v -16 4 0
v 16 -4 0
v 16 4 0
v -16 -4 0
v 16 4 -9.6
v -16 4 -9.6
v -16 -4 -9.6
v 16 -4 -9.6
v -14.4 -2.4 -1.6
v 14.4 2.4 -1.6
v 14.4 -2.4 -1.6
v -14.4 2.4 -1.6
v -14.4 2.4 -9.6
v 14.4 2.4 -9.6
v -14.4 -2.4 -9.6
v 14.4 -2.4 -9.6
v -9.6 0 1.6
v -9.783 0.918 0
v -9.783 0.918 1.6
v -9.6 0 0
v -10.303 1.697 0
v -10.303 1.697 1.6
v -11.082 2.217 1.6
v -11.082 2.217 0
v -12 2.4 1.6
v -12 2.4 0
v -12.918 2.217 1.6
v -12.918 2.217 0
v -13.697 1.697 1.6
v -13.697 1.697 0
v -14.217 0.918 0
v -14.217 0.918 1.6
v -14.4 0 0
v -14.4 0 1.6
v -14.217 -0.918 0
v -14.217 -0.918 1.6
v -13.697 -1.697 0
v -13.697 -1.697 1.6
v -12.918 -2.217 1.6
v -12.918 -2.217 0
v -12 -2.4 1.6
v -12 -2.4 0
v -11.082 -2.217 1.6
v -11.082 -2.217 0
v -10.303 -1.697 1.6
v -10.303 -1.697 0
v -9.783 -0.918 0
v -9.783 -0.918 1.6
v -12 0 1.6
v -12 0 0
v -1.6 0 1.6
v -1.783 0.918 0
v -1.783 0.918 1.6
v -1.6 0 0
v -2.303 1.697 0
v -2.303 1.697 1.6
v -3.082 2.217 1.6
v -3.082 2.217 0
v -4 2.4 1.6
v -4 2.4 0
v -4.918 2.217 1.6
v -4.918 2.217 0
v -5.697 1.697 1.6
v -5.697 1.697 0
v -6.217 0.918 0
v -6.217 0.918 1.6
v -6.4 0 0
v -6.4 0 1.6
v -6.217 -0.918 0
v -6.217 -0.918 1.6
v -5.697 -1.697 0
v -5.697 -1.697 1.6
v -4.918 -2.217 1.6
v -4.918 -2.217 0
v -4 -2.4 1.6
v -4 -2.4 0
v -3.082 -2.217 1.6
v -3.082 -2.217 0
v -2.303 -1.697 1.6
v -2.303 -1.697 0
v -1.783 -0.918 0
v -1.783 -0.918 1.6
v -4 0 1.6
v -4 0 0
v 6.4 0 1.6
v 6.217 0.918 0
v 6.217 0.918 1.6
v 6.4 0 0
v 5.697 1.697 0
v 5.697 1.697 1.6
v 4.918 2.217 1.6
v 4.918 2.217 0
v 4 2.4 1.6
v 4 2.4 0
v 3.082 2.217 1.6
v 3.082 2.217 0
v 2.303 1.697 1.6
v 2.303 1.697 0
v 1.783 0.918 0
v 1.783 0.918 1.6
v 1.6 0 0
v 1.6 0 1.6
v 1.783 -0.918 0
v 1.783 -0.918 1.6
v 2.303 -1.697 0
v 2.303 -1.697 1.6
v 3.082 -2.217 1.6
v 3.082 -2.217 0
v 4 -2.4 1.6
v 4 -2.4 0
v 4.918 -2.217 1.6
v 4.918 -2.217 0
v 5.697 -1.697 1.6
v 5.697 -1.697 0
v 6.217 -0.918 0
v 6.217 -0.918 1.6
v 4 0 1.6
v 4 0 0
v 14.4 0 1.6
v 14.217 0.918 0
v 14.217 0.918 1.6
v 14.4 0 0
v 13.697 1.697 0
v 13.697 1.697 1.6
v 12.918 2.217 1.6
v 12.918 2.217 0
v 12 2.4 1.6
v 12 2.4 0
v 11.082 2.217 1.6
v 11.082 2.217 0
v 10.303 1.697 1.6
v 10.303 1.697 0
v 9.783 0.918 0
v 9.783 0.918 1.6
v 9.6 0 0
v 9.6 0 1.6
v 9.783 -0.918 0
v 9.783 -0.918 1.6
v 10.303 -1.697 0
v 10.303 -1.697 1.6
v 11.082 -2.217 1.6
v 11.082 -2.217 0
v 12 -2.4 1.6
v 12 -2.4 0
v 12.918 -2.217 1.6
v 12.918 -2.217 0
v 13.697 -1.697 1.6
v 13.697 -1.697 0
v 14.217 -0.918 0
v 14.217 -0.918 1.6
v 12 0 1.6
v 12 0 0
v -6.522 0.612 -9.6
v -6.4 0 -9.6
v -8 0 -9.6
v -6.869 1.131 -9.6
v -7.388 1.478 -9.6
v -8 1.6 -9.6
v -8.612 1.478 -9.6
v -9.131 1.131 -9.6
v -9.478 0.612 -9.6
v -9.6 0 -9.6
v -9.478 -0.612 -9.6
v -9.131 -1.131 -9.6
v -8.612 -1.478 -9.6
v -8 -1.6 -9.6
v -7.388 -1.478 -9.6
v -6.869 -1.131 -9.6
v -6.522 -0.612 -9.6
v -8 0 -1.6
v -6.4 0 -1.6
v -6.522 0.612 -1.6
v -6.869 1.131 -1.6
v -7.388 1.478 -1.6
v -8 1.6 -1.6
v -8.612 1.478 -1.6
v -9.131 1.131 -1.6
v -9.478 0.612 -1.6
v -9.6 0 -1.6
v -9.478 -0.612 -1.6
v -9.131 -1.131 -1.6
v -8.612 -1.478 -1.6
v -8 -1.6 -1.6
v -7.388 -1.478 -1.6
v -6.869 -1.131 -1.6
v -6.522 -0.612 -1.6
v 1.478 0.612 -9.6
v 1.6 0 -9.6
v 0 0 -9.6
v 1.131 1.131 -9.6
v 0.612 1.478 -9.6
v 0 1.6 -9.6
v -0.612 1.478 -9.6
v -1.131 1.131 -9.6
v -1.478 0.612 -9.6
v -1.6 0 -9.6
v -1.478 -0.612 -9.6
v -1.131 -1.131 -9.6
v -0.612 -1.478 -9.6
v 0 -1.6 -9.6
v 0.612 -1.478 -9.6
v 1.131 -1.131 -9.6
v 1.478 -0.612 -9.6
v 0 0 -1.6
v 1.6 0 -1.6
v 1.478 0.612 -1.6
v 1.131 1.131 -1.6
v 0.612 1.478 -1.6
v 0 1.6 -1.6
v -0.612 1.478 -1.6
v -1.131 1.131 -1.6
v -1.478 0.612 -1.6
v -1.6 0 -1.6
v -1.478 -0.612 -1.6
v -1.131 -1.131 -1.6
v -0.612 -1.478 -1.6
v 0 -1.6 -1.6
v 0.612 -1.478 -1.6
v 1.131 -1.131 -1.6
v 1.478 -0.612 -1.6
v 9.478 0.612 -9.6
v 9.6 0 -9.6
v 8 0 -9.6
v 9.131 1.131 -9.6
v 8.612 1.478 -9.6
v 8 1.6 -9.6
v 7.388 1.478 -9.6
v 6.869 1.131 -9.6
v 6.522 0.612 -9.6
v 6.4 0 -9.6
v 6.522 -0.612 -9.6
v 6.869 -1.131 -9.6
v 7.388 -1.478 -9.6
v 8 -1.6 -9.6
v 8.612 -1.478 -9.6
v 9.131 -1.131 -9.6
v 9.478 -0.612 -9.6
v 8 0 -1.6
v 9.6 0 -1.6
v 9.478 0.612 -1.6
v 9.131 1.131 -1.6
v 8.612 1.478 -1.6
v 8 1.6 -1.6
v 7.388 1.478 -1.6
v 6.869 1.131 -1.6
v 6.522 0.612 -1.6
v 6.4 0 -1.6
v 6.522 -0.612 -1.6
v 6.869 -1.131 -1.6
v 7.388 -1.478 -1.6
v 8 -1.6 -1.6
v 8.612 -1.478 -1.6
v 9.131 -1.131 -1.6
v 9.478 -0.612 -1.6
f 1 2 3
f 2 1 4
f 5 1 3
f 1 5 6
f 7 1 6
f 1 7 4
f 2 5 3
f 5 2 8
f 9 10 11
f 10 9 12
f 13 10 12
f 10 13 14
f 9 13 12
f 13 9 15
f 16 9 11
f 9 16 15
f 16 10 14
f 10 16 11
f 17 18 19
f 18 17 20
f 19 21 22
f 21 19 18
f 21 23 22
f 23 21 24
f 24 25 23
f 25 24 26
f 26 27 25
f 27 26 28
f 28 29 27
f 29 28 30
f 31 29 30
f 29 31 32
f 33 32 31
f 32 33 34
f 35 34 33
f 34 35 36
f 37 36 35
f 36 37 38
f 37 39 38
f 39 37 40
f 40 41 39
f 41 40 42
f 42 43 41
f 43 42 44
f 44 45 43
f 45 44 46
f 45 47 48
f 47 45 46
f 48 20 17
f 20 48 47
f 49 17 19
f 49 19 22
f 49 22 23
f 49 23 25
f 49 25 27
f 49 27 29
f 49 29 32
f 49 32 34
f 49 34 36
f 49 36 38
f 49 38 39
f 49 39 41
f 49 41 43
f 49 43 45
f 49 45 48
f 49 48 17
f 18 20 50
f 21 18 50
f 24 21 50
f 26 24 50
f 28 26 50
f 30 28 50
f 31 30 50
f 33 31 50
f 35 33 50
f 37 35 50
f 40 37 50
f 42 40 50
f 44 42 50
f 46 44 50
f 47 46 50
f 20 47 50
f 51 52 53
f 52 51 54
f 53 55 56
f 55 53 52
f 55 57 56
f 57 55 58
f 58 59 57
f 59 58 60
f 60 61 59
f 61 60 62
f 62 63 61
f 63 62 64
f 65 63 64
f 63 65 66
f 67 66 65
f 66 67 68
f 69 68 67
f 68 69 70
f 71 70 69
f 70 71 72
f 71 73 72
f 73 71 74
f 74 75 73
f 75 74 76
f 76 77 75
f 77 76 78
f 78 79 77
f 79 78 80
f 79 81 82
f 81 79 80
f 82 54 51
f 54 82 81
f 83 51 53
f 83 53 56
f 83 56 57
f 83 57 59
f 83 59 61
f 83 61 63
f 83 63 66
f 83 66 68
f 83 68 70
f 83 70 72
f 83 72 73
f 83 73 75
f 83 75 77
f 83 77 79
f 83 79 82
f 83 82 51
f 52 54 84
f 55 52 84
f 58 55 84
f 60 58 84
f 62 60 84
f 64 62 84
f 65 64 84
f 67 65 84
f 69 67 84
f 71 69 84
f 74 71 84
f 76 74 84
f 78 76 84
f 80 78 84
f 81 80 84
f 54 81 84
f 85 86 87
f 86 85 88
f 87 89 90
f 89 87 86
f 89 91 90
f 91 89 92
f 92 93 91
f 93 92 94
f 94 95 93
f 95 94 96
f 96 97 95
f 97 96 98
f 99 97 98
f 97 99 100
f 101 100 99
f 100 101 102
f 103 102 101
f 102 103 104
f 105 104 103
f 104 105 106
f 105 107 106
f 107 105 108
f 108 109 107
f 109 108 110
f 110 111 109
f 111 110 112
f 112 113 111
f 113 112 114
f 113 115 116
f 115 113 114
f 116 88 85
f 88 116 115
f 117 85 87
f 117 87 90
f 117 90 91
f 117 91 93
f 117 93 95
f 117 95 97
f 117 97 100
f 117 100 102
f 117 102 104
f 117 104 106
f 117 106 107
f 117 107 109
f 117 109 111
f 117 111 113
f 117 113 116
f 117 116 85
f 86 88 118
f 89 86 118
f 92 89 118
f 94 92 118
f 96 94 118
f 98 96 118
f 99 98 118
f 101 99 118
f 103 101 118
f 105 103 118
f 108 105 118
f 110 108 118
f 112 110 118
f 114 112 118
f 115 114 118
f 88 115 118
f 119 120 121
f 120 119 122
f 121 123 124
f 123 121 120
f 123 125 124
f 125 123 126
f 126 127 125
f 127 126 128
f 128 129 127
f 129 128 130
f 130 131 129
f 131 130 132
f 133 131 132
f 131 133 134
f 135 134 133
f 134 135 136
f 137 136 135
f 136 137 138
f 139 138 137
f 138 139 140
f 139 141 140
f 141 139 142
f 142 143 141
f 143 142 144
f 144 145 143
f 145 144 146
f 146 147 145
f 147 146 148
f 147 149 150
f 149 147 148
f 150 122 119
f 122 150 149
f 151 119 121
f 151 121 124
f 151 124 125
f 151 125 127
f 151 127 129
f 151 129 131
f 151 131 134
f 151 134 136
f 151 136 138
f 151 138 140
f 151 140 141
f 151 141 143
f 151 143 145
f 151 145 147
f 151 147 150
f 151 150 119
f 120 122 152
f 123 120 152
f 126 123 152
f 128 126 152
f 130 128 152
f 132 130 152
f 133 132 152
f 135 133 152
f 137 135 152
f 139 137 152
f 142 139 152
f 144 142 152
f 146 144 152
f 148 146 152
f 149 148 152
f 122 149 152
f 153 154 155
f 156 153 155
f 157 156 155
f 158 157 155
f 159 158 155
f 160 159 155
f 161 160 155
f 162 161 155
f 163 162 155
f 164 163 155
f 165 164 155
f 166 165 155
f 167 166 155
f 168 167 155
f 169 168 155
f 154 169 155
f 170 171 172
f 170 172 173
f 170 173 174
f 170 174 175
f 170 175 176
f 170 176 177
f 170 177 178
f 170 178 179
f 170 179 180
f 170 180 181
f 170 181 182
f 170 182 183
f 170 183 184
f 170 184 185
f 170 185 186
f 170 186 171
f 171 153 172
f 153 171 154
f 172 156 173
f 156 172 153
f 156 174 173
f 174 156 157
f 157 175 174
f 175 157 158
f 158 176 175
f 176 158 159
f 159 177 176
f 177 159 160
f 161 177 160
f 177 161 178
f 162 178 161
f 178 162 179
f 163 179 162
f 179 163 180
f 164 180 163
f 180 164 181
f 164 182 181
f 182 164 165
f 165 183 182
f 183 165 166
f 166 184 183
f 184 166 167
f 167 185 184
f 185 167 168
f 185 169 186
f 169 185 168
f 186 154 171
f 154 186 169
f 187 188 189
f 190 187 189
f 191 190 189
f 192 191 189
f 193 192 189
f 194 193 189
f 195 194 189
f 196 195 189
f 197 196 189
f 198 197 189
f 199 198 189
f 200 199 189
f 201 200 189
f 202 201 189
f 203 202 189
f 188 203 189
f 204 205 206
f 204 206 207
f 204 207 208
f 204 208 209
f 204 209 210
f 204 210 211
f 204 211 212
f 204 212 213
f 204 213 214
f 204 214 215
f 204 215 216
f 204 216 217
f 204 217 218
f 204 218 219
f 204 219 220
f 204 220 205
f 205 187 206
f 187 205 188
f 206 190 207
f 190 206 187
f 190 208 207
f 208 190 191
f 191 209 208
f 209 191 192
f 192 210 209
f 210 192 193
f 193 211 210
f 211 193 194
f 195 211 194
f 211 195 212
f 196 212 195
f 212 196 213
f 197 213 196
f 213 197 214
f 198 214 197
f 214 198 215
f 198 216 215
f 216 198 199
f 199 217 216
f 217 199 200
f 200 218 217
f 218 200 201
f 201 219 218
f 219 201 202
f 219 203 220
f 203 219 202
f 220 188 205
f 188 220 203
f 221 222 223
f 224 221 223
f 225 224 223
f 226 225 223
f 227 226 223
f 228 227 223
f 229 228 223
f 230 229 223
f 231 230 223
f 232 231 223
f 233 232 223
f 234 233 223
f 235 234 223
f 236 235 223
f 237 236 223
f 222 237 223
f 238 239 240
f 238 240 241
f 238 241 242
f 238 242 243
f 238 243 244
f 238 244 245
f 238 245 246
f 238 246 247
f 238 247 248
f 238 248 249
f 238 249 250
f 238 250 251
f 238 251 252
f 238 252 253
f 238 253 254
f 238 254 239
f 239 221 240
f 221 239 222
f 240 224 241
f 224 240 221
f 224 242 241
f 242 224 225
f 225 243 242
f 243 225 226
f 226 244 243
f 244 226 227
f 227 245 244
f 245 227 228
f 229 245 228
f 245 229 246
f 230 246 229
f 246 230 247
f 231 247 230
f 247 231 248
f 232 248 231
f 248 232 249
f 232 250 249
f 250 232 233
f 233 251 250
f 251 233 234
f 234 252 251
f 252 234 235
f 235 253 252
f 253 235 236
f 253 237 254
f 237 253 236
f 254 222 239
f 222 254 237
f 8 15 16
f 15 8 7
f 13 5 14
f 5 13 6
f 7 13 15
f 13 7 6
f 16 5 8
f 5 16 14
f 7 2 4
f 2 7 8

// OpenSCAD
// file: ../p/4-4edge.scad
use <../lib.scad>
function ldraw_lib__4_4edge() = [
// 0 Circle 1.0
// 0 Name: 4-4edge.dat
// 0 Author: James Jessiman
// 0 !LDRAW_ORG Primitive UPDATE 2017-01
// 0 !LICENSE Licensed under CC BY 2.0 and CC BY 4.0 : see CAreadme.txt
// 
// 0 BFC CERTIFY CCW
  [0,"BFC","CERTIFY"],
  [0,"BFC","CCW"],
// 
// 0 !HISTORY 1998-12-15 [PTadmin] Official Update 1998-10
// 0 !HISTORY 2005-12-28 [PTadmin] Official Update 2005-01
// 0 !HISTORY 2007-06-24 [PTadmin] Header formatted for Contributor Agreement
// 0 !HISTORY 2008-07-01 [PTadmin] Official Update 2008-01
// 0 !HISTORY 2017-01-15 [Steffen] BFCed
// 0 !HISTORY 2017-12-30 [PTadmin] Official Update 2017-01
// 
// 
// 2 24 1 0 0 0.9239 0 0.3827
  [2,24,1,0,0,0.9239,0,0.3827],
// 2 24 0.9239 0 0.3827 0.7071 0 0.7071
  [2,24,0.9239,0,0.3827,0.7071,0,0.7071],
// 2 24 0.7071 0 0.7071 0.3827 0 0.9239
  [2,24,0.7071,0,0.7071,0.3827,0,0.9239],
// 2 24 0.3827 0 0.9239 0 0 1
  [2,24,0.3827,0,0.9239,0,0,1],
// 2 24 0 0 1 -0.3827 0 0.9239
  [2,24,0,0,1,-0.3827,0,0.9239],
// 2 24 -0.3827 0 0.9239 -0.7071 0 0.7071
  [2,24,-0.3827,0,0.9239,-0.7071,0,0.7071],
// 2 24 -0.7071 0 0.7071 -0.9239 0 0.3827
  [2,24,-0.7071,0,0.7071,-0.9239,0,0.3827],
// 2 24 -0.9239 0 0.3827 -1 0 -0
  [2,24,-0.9239,0,0.3827,-1,0,-0],
// 2 24 -1 0 -0 -0.9239 0 -0.3827
  [2,24,-1,0,-0,-0.9239,0,-0.3827],
// 2 24 -0.9239 0 -0.3827 -0.7071 0 -0.7071
  [2,24,-0.9239,0,-0.3827,-0.7071,0,-0.7071],
// 2 24 -0.7071 0 -0.7071 -0.3827 0 -0.9239
  [2,24,-0.7071,0,-0.7071,-0.3827,0,-0.9239],
// 2 24 -0.3827 0 -0.9239 0 0 -1
  [2,24,-0.3827,0,-0.9239,0,0,-1],
// 2 24 0 0 -1 0.3827 0 -0.9239
  [2,24,0,0,-1,0.3827,0,-0.9239],
// 2 24 0.3827 0 -0.9239 0.7071 0 -0.7071
  [2,24,0.3827,0,-0.9239,0.7071,0,-0.7071],
// 2 24 0.7071 0 -0.7071 0.9239 0 -0.3827
  [2,24,0.7071,0,-0.7071,0.9239,0,-0.3827],
// 2 24 0.9239 0 -0.3827 1 0 0
  [2,24,0.9239,0,-0.3827,1,0,0],
];
module ldraw_lib__4_4edge(step=0, col=false, unit=2/5, alt=false, line=0.2, solid=!$preview)
    makepoly(ldraw_lib__4_4edge(), step=step, col=col, unit=unit, alt=alt, line=line, solid=solid);
ldraw_lib__4_4edge(line=0.2);
// file: ../p/4-4disc.scad
use <../lib.scad>
function ldraw_lib__4_4disc() = [
// 0 Disc 1.0
// 0 Name: 4-4disc.dat
// 0 Author: James Jessiman
// 0 !LDRAW_ORG Primitive UPDATE 2002-02
// 0 !LICENSE Licensed under CC BY 2.0 and CC BY 4.0 : see CAreadme.txt
// 
// 0 BFC CERTIFY CCW
  [0,"BFC","CERTIFY"],
  [0,"BFC","CCW"],
// 
// 0 !HISTORY 1998-12-15 [PTadmin] Official Update 1998-10
// 0 !HISTORY 2002-03-23 [sbliss] Added BFC statement
// 0 !HISTORY 2002-04-25 [PTadmin] Official Update 2002-02
// 0 !HISTORY 2007-06-24 [PTadmin] Header formatted for Contributor Agreement
// 0 !HISTORY 2008-07-01 [PTadmin] Official Update 2008-01
// 
// 
// 3 16 0 0 0 1 0 0 0.9239 0 0.3827
  [3,16,0,0,0,1,0,0,0.9239,0,0.3827],
// 3 16 0 0 0 0.9239 0 0.3827 0.7071 0 0.7071
  [3,16,0,0,0,0.9239,0,0.3827,0.7071,0,0.7071],
// 3 16 0 0 0 0.7071 0 0.7071 0.3827 0 0.9239
  [3,16,0,0,0,0.7071,0,0.7071,0.3827,0,0.9239],
// 3 16 0 0 0 0.3827 0 0.9239 0 0 1
  [3,16,0,0,0,0.3827,0,0.9239,0,0,1],
// 3 16 0 0 0 0 0 1 -0.3827 0 0.9239
  [3,16,0,0,0,0,0,1,-0.3827,0,0.9239],
// 3 16 0 0 0 -0.3827 0 0.9239 -0.7071 0 0.7071
  [3,16,0,0,0,-0.3827,0,0.9239,-0.7071,0,0.7071],
// 3 16 0 0 0 -0.7071 0 0.7071 -0.9239 0 0.3827
  [3,16,0,0,0,-0.7071,0,0.7071,-0.9239,0,0.3827],
// 3 16 0 0 0 -0.9239 0 0.3827 -1 0 -0
  [3,16,0,0,0,-0.9239,0,0.3827,-1,0,-0],
// 3 16 0 0 0 -1 0 -0 -0.9239 0 -0.3827
  [3,16,0,0,0,-1,0,-0,-0.9239,0,-0.3827],
// 3 16 0 0 0 -0.9239 0 -0.3827 -0.7071 0 -0.7071
  [3,16,0,0,0,-0.9239,0,-0.3827,-0.7071,0,-0.7071],
// 3 16 0 0 0 -0.7071 0 -0.7071 -0.3827 0 -0.9239
  [3,16,0,0,0,-0.7071,0,-0.7071,-0.3827,0,-0.9239],
// 3 16 0 0 0 -0.3827 0 -0.9239 0 0 -1
  [3,16,0,0,0,-0.3827,0,-0.9239,0,0,-1],
// 3 16 0 0 0 0 0 -1 0.3827 0 -0.9239
  [3,16,0,0,0,0,0,-1,0.3827,0,-0.9239],
// 3 16 0 0 0 0.3827 0 -0.9239 0.7071 0 -0.7071
  [3,16,0,0,0,0.3827,0,-0.9239,0.7071,0,-0.7071],
// 3 16 0 0 0 0.7071 0 -0.7071 0.9239 0 -0.3827
  [3,16,0,0,0,0.7071,0,-0.7071,0.9239,0,-0.3827],
// 3 16 0 0 0 0.9239 0 -0.3827 1 0 0
  [3,16,0,0,0,0.9239,0,-0.3827,1,0,0],
// 0
];
module ldraw_lib__4_4disc(step=0, col=false, unit=2/5, alt=false, line=0.2, solid=!$preview)
    makepoly(ldraw_lib__4_4disc(), step=step, col=col, unit=unit, alt=alt, line=line, solid=solid);
ldraw_lib__4_4disc(line=0.2);
// file: ../p/4-4cyli.scad
use <../lib.scad>
$fa=1; $fs=0.2;
function ldraw_lib__4_4cyli(realsolid=false) = [
// 0 Cylinder 1.0
// 0 Name: 4-4cyli.dat
// 0 Author: James Jessiman
// 0 !LDRAW_ORG Primitive UPDATE 2005-01
// 0 !LICENSE Licensed under CC BY 2.0 and CC BY 4.0 : see CAreadme.txt
// 
// 0 BFC CERTIFY CCW
  [0,"BFC","CERTIFY"],
  [0,"BFC","CCW"],
// 
// 0 !HISTORY 1998-12-15 [PTadmin] Official Update 1998-10
// 0 !HISTORY 2002-03-23 [sbliss] Added BFC statement; merged headers from files in distributions LDraw 0.27 and Complete.
// 0 !HISTORY 2002-04-25 [PTadmin] Official Update 2002-02
// 0 !HISTORY 2004-12-14 [guyvivan] BFC CCW
// 0 !HISTORY 2005-12-28 [PTadmin] Official Update 2005-01
// 0 !HISTORY 2007-06-24 [PTadmin] Header formatted for Contributor Agreement
// 0 !HISTORY 2008-07-01 [PTadmin] Official Update 2008-01
// 
// 
// 4 16 1 1 0 0.9239 1 0.3827 0.9239 0 0.3827 1 0 0
  [4,16,1,1,0,0.9239,1,0.3827,0.9239,0,0.3827,1,0,0],
// 5 24 1 0 0 1 1 0 0.9239 0 0.3827 0.9239 0 -0.3827
  [5,24,1,0,0,1,1,0,0.9239,0,0.3827,0.9239,0,-0.3827],
// 4 16 0.9239 1 0.3827 0.7071 1 0.7071 0.7071 0 0.7071 0.9239 0 0.3827
  [4,16,0.9239,1,0.3827,0.7071,1,0.7071,0.7071,0,0.7071,0.9239,0,0.3827],
// 5 24 0.9239 0 0.3827 0.9239 1 0.3827 0.7071 0 0.7071 1 0 0
  [5,24,0.9239,0,0.3827,0.9239,1,0.3827,0.7071,0,0.7071,1,0,0],
// 4 16 0.7071 1 0.7071 0.3827 1 0.9239 0.3827 0 0.9239 0.7071 0 0.7071
  [4,16,0.7071,1,0.7071,0.3827,1,0.9239,0.3827,0,0.9239,0.7071,0,0.7071],
// 5 24 0.7071 0 0.7071 0.7071 1 0.7071 0.3827 0 0.9239 0.9239 0 0.3827
  [5,24,0.7071,0,0.7071,0.7071,1,0.7071,0.3827,0,0.9239,0.9239,0,0.3827],
// 4 16 0.3827 1 0.9239 0 1 1 0 0 1 0.3827 0 0.9239
  [4,16,0.3827,1,0.9239,0,1,1,0,0,1,0.3827,0,0.9239],
// 5 24 0.3827 0 0.9239 0.3827 1 0.9239 0 0 1 0.7071 0 0.7071
  [5,24,0.3827,0,0.9239,0.3827,1,0.9239,0,0,1,0.7071,0,0.7071],
// 4 16 0 1 1 -0.3827 1 0.9239 -0.3827 0 0.9239 0 0 1
  [4,16,0,1,1,-0.3827,1,0.9239,-0.3827,0,0.9239,0,0,1],
// 5 24 0 0 1 0 1 1 -0.3827 0 0.9239 0.3827 0 0.9239
  [5,24,0,0,1,0,1,1,-0.3827,0,0.9239,0.3827,0,0.9239],
// 4 16 -0.3827 1 0.9239 -0.7071 1 0.7071 -0.7071 0 0.7071 -0.3827 0 0.9239
  [4,16,-0.3827,1,0.9239,-0.7071,1,0.7071,-0.7071,0,0.7071,-0.3827,0,0.9239],
// 5 24 -0.3827 0 0.9239 -0.3827 1 0.9239 -0.7071 0 0.7071 0 0 1
  [5,24,-0.3827,0,0.9239,-0.3827,1,0.9239,-0.7071,0,0.7071,0,0,1],
// 4 16 -0.7071 1 0.7071 -0.9239 1 0.3827 -0.9239 0 0.3827 -0.7071 0 0.7071
  [4,16,-0.7071,1,0.7071,-0.9239,1,0.3827,-0.9239,0,0.3827,-0.7071,0,0.7071],
// 5 24 -0.7071 0 0.7071 -0.7071 1 0.7071 -0.9239 0 0.3827 -0.3827 0 0.9239
  [5,24,-0.7071,0,0.7071,-0.7071,1,0.7071,-0.9239,0,0.3827,-0.3827,0,0.9239],
// 4 16 -0.9239 1 0.3827 -1 1 0 -1 0 0 -0.9239 0 0.3827
  [4,16,-0.9239,1,0.3827,-1,1,0,-1,0,0,-0.9239,0,0.3827],
// 5 24 -0.9239 0 0.3827 -0.9239 1 0.3827 -1 0 0 -0.7071 0 0.7071
  [5,24,-0.9239,0,0.3827,-0.9239,1,0.3827,-1,0,0,-0.7071,0,0.7071],
// 4 16 -1 1 0 -0.9239 1 -0.3827 -0.9239 0 -0.3827 -1 0 0
  [4,16,-1,1,0,-0.9239,1,-0.3827,-0.9239,0,-0.3827,-1,0,0],
// 5 24 -1 0 0 -1 1 0 -0.9239 0 -0.3827 -0.9239 0 0.3827
  [5,24,-1,0,0,-1,1,0,-0.9239,0,-0.3827,-0.9239,0,0.3827],
// 4 16 -0.9239 1 -0.3827 -0.7071 1 -0.7071 -0.7071 0 -0.7071 -0.9239 0 -0.3827
  [4,16,-0.9239,1,-0.3827,-0.7071,1,-0.7071,-0.7071,0,-0.7071,-0.9239,0,-0.3827],
// 5 24 -0.9239 0 -0.3827 -0.9239 1 -0.3827 -0.7071 0 -0.7071 -1 0 0
  [5,24,-0.9239,0,-0.3827,-0.9239,1,-0.3827,-0.7071,0,-0.7071,-1,0,0],
// 4 16 -0.7071 1 -0.7071 -0.3827 1 -0.9239 -0.3827 0 -0.9239 -0.7071 0 -0.7071
  [4,16,-0.7071,1,-0.7071,-0.3827,1,-0.9239,-0.3827,0,-0.9239,-0.7071,0,-0.7071],
// 5 24 -0.7071 0 -0.7071 -0.7071 1 -0.7071 -0.3827 0 -0.9239 -0.9239 0 -0.3827
  [5,24,-0.7071,0,-0.7071,-0.7071,1,-0.7071,-0.3827,0,-0.9239,-0.9239,0,-0.3827],
// 4 16 -0.3827 1 -0.9239 0 1 -1 0 0 -1 -0.3827 0 -0.9239
  [4,16,-0.3827,1,-0.9239,0,1,-1,0,0,-1,-0.3827,0,-0.9239],
// 5 24 -0.3827 0 -0.9239 -0.3827 1 -0.9239 0 0 -1 -0.7071 0 -0.7071
  [5,24,-0.3827,0,-0.9239,-0.3827,1,-0.9239,0,0,-1,-0.7071,0,-0.7071],
// 4 16 0 1 -1 0.3827 1 -0.9239 0.3827 0 -0.9239 0 0 -1
  [4,16,0,1,-1,0.3827,1,-0.9239,0.3827,0,-0.9239,0,0,-1],
// 5 24 0 0 -1 0 1 -1 0.3827 0 -0.9239 -0.3827 0 -0.9239
  [5,24,0,0,-1,0,1,-1,0.3827,0,-0.9239,-0.3827,0,-0.9239],
// 4 16 0.3827 1 -0.9239 0.7071 1 -0.7071 0.7071 0 -0.7071 0.3827 0 -0.9239
  [4,16,0.3827,1,-0.9239,0.7071,1,-0.7071,0.7071,0,-0.7071,0.3827,0,-0.9239],
// 5 24 0.3827 0 -0.9239 0.3827 1 -0.9239 0.7071 0 -0.7071 0 0 -1
  [5,24,0.3827,0,-0.9239,0.3827,1,-0.9239,0.7071,0,-0.7071,0,0,-1],
// 4 16 0.7071 1 -0.7071 0.9239 1 -0.3827 0.9239 0 -0.3827 0.7071 0 -0.7071
  [4,16,0.7071,1,-0.7071,0.9239,1,-0.3827,0.9239,0,-0.3827,0.7071,0,-0.7071],
// 5 24 0.7071 0 -0.7071 0.7071 1 -0.7071 0.9239 0 -0.3827 0.3827 0 -0.9239
  [5,24,0.7071,0,-0.7071,0.7071,1,-0.7071,0.9239,0,-0.3827,0.3827,0,-0.9239],
// 4 16 0.9239 1 -0.3827 1 1 0 1 0 0 0.9239 0 -0.3827
  [4,16,0.9239,1,-0.3827,1,1,0,1,0,0,0.9239,0,-0.3827],
// 5 24 0.9239 0 -0.3827 0.9239 1 -0.3827 1 0 0 0.7071 0 -0.7071
  [5,24,0.9239,0,-0.3827,0.9239,1,-0.3827,1,0,0,0.7071,0,-0.7071],
// 0
];
module ldraw_lib__4_4cyli(step=0, col=false, unit=2/5, alt=false, line=0.2, solid=!$preview)
    makepoly(ldraw_lib__4_4cyli(solid), step=step, col=col, unit=unit, alt=alt, line=line, solid=solid);
ldraw_lib__4_4cyli(line=0.2);
// file: ../p/stud3.scad
use <../lib.scad>
use <4-4cyli.scad>
use <4-4disc.scad>
use <4-4edge.scad>
function ldraw_lib__stud3() = [
// 0 Stud Tube Solid
// 0 Name: stud3.dat
// 0 Author: James Jessiman
// 0 !LDRAW_ORG Primitive UPDATE 2012-01
// 0 !LICENSE Licensed under CC BY 4.0 : see CAreadme.txt
// 
// 0 BFC CERTIFY CCW
  [0,"BFC","CERTIFY"],
  [0,"BFC","CCW"],
// 
// 0 !HISTORY 2002-04-04 [sbliss] Modified for BFC compliance
// 0 !HISTORY 2002-04-25 [PTadmin] Official Update 2002-02
// 0 !HISTORY 2007-06-24 [PTadmin] Header formatted for Contributor Agreement
// 0 !HISTORY 2008-07-01 [PTadmin] Official Update 2008-01
// 0 !HISTORY 2012-02-16 [Philo] Changed to CCW
// 0 !HISTORY 2012-03-30 [PTadmin] Official Update 2012-01
// 
// 
// 1 16 0 -4 0 4 0 0 0 1 0 0 0 4 4-4edge.dat
  [1,16,0,-4,0,4,0,0,0,1,0,0,0,4, ldraw_lib__4_4edge()],
// 1 16 0 0 0 4 0 0 0 1 0 0 0 4 4-4edge.dat
  [1,16,0,0,0,4,0,0,0,1,0,0,0,4, ldraw_lib__4_4edge()],
// 1 16 0 -4 0 4 0 0 0 1 0 0 0 4 4-4disc.dat
  [1,16,0,-4,0,4,0,0,0,1,0,0,0,4, ldraw_lib__4_4disc()],
  [-1,16,0,0,0,4,0,0,0,-1,0,0,0,4, ldraw_lib__4_4disc()],
// 1 16 0 -4 0 4 0 0 0 4 0 0 0 4 4-4cyli.dat
  [1,16,0,-4,0,4,0,0,0,4,0,0,0,4, ldraw_lib__4_4cyli()],
];
module ldraw_lib__stud3(step=0, col=false, unit=2/5, alt=false, line=0.2, solid=!$preview)
    makepoly(ldraw_lib__stud3(), step=step, col=col, unit=unit, alt=alt, line=line, solid=solid);
ldraw_lib__stud3(line=0.2);
// file: ../p/stud.scad
use <../lib.scad>
use <4-4cyli.scad>
use <4-4disc.scad>
use <4-4edge.scad>
function ldraw_lib__stud() = [
// 0 Stud
// 0 Name: stud.dat
// 0 Author: James Jessiman
// 0 !LDRAW_ORG Primitive UPDATE 2012-01
// 0 !LICENSE Licensed under CC BY 4.0 : see CAreadme.txt
// 
// 0 BFC CERTIFY CCW
  [0,"BFC","CERTIFY"],
  [0,"BFC","CCW"],
// 
// 0 !HISTORY 2002-04-04 [sbliss] Modified for BFC compliance
// 0 !HISTORY 2002-04-25 [PTadmin] Official Update 2002-02
// 0 !HISTORY 2007-06-24 [PTadmin] Header formatted for Contributor Agreement
// 0 !HISTORY 2008-07-01 [PTadmin] Official Update 2008-01
// 0 !HISTORY 2012-02-16 [Philo] Changed to CCW
// 0 !HISTORY 2012-03-30 [PTadmin] Official Update 2012-01
// 
// 
// 1 16 0 0 0 6 0 0 0 1 0 0 0 6 4-4edge.dat
  [1,16,0,0,0,6,0,0,0,1,0,0,0,6, ldraw_lib__4_4edge()],
// 1 16 0 -4 0 6 0 0 0 1 0 0 0 6 4-4edge.dat
  [1,16,0,-4,0,6,0,0,0,1,0,0,0,6, ldraw_lib__4_4edge()],
// 1 16 0 0 0 6 0 0 0 -4 0 0 0 6 4-4cyli.dat
  [1,16,0,0,0,6,0,0,0,-4,0,0,0,6, ldraw_lib__4_4cyli()],
// 1 16 0 -4 0 6 0 0 0 1 0 0 0 6 4-4disc.dat
  [1,16,0,-4,0,6,0,0,0,1,0,0,0,6, ldraw_lib__4_4disc()],
  [-1,16,0,0,0,6,0,0,0,-1,0,0,0,6, ldraw_lib__4_4disc()],
];
module ldraw_lib__stud(step=0, col=false, unit=2/5, alt=false, line=0.2, solid=!$preview)
    makepoly(ldraw_lib__stud(), step=step, col=col, unit=unit, alt=alt, line=line, solid=solid);
ldraw_lib__stud(line=0.2);
// file: ../p/box5.scad
use <../lib.scad>
function ldraw_lib__box5() = [
// 0 Box with 5 Faces and All Edges
// 0 Name: box5.dat
// 0 Author: James Jessiman
// 0 !LDRAW_ORG Primitive UPDATE 2012-01
// 0 !LICENSE Licensed under CC BY 2.0 and CC BY 4.0 : see CAreadme.txt
// 
// 0 BFC CERTIFY CCW
  [0,"BFC","CERTIFY"],
  [0,"BFC","CCW"],
// 
// 0 !HISTORY 2002-04-03 [sbliss] Modified for BFC compliance
// 0 !HISTORY 2002-04-25 [PTadmin] Official Update 2002-02
// 0 !HISTORY 2007-06-24 [PTadmin] Header formatted for Contributor Agreement
// 0 !HISTORY 2008-07-01 [PTadmin] Official Update 2008-01
// 0 !HISTORY 2012-02-16 [Philo] Changed to CCW
// 0 !HISTORY 2012-03-30 [PTadmin] Official Update 2012-01
// 
// 
// 2 24 1 1 1 -1 1 1
  [2,24,1,1,1,-1,1,1],
// 2 24 -1 1 1 -1 1 -1
  [2,24,-1,1,1,-1,1,-1],
// 2 24 -1 1 -1 1 1 -1
  [2,24,-1,1,-1,1,1,-1],
// 2 24 1 1 -1 1 1 1
  [2,24,1,1,-1,1,1,1],
// 2 24 1 0 1 -1 0 1
  [2,24,1,0,1,-1,0,1],
// 2 24 -1 0 1 -1 0 -1
  [2,24,-1,0,1,-1,0,-1],
// 2 24 -1 0 -1 1 0 -1
  [2,24,-1,0,-1,1,0,-1],
// 2 24 1 0 -1 1 0 1
  [2,24,1,0,-1,1,0,1],
// 2 24 1 0 1 1 1 1
  [2,24,1,0,1,1,1,1],
// 2 24 -1 0 1 -1 1 1
  [2,24,-1,0,1,-1,1,1],
// 2 24 1 0 -1 1 1 -1
  [2,24,1,0,-1,1,1,-1],
// 2 24 -1 0 -1 -1 1 -1
  [2,24,-1,0,-1,-1,1,-1],
// 4 16 -1 1 1 1 1 1 1 1 -1 -1 1 -1
  [4,16,-1,1,1,1,1,1,1,1,-1,-1,1,-1],
// 4 16 -1 1 1 -1 0 1 1 0 1 1 1 1
  [4,16,-1,1,1,-1,0,1,1,0,1,1,1,1],
// 4 16 -1 1 -1 -1 0 -1 -1 0 1 -1 1 1
  [4,16,-1,1,-1,-1,0,-1,-1,0,1,-1,1,1],
// 4 16 1 1 -1 1 0 -1 -1 0 -1 -1 1 -1
  [4,16,1,1,-1,1,0,-1,-1,0,-1,-1,1,-1],
// 4 16 1 1 1 1 0 1 1 0 -1 1 1 -1
  [4,16,1,1,1,1,0,1,1,0,-1,1,1,-1],
];
makepoly(ldraw_lib__box5(), line=0.2);
// file: ../p/box4t.scad
use <../lib.scad>
function ldraw_lib__box4t() = [
// 0 Box with 4 Adjacent Faces and All Edges
// 0 Name: box4t.dat
// 0 Author: Tore Eriksson [Tore_Eriksson]
// 0 !LDRAW_ORG Primitive UPDATE 2003-02
// 0 !LICENSE Licensed under CC BY 2.0 and CC BY 4.0 : see CAreadme.txt
// 
// 0 BFC CERTIFY CCW
  [0,"BFC","CERTIFY"],
  [0,"BFC","CCW"],
// 
// 0 !HISTORY 1997-09-29 [PTadmin] Official Update 1997-15
// 0 !HISTORY 2002-08-31 [izanette] Modified with WINDZ for BFC compliance
// 0 !HISTORY 2003-08-01 [PTadmin] Official Update 2003-02
// 0 !HISTORY 2007-06-24 [PTadmin] Header formatted for Contributor Agreement
// 0 !HISTORY 2008-07-01 [PTadmin] Official Update 2008-01
// 
// 
// 2 24 1 1 1 -1 1 1
  [2,24,1,1,1,-1,1,1],
// 2 24 -1 1 1 -1 1 -1
  [2,24,-1,1,1,-1,1,-1],
// 2 24 -1 1 -1 1 1 -1
  [2,24,-1,1,-1,1,1,-1],
// 2 24 1 1 -1 1 1 1
  [2,24,1,1,-1,1,1,1],
// 2 24 1 0 1 -1 0 1
  [2,24,1,0,1,-1,0,1],
// 2 24 -1 0 1 -1 0 -1
  [2,24,-1,0,1,-1,0,-1],
// 2 24 -1 0 -1 1 0 -1
  [2,24,-1,0,-1,1,0,-1],
// 2 24 1 0 -1 1 0 1
  [2,24,1,0,-1,1,0,1],
// 2 24 1 0 1 1 1 1
  [2,24,1,0,1,1,1,1],
// 2 24 -1 0 1 -1 1 1
  [2,24,-1,0,1,-1,1,1],
// 2 24 1 0 -1 1 1 -1
  [2,24,1,0,-1,1,1,-1],
// 2 24 -1 0 -1 -1 1 -1
  [2,24,-1,0,-1,-1,1,-1],
// 4 16 1 1 1 1 1 -1 -1 1 -1 -1 1 1
  [4,16,1,1,1,1,1,-1,-1,1,-1,-1,1,1],
// 4 16 1 1 1 -1 1 1 -1 0 1 1 0 1
  [4,16,1,1,1,-1,1,1,-1,0,1,1,0,1],
// 4 16 -1 1 1 -1 1 -1 -1 0 -1 -1 0 1
  [4,16,-1,1,1,-1,1,-1,-1,0,-1,-1,0,1],
// 0 4 16 -1 1 -1 -1 0 -1 1 0 -1 1 1 -1
// 4 16 1 1 -1 1 1 1 1 0 1 1 0 -1
  [4,16,1,1,-1,1,1,1,1,0,1,1,0,-1],
// 0
];
makepoly(ldraw_lib__box4t(), line=0.2);
// file: s/3010s01.scad
use <../../lib.scad>
use <../../p/box4t.scad>
use <../../p/box5.scad>
use <../../p/stud.scad>
use <../../p/stud3.scad>
$fa=1; $fs=0.2;
function ldraw_lib__s__3010s01(realsolid=false) = [
// 0 ~Brick  1 x  4 without Front Face
// 0 Name: s\3010s01.dat
// 0 Author: Tony Hafner [hafhead]
// 0 !LDRAW_ORG Subpart UPDATE 2003-02
// 0 !LICENSE Licensed under CC BY 2.0 and CC BY 4.0 : see CAreadme.txt
// 
// 0 BFC CERTIFY CW
  [0,"BFC","CERTIFY"],
  [0,"BFC","CW"],
// 
// 0 !HISTORY 2003-08-01 [PTadmin] Official Update 2003-02
// 0 !HISTORY 2007-08-29 [PTadmin] Header formatted for Contributor Agreement
// 0 !HISTORY 2008-07-01 [PTadmin] Official Update 2008-01
// 
// 
// 1 16 0 24 0 40 0 0 0 -24 0 0 0 10 box4t.dat
  [1,16,0,24,0,40,0,0,0,-24,0,0,0,10, ldraw_lib__box4t(realsolid)],
// 0 BFC INVERTNEXT
  [0,"BFC","INVERTNEXT"],
// 1 16 0 24 0 36 0 0 0 -20 0 0 0 6 box5.dat
  [1,16,0,24,0,36,0,0,0,-20,0,0,0,6, ldraw_lib__box5(realsolid)],
// 1 16 -30 0 0 1 0 0 0 1 0 0 0 1 stud.dat
  [1,16,-30,0,0,1,0,0,0,1,0,0,0,1, ldraw_lib__stud(realsolid)],
// 1 16 -10 0 0 1 0 0 0 1 0 0 0 1 stud.dat
  [1,16,-10,0,0,1,0,0,0,1,0,0,0,1, ldraw_lib__stud(realsolid)],
// 1 16 10 0 0 1 0 0 0 1 0 0 0 1 stud.dat
  [1,16,10,0,0,1,0,0,0,1,0,0,0,1, ldraw_lib__stud(realsolid)],
// 1 16 30 0 0 1 0 0 0 1 0 0 0 1 stud.dat
  [1,16,30,0,0,1,0,0,0,1,0,0,0,1, ldraw_lib__stud(realsolid)],
// 1 16 -20 4 0 1 0 0 0 -5 0 0 0 1 stud3.dat
  [1,16,-20,4,0,1,0,0,0,-5,0,0,0,1, ldraw_lib__stud3(realsolid)],
// 1 16 0 4 0 1 0 0 0 -5 0 0 0 1 stud3.dat
  [1,16,0,4,0,1,0,0,0,-5,0,0,0,1, ldraw_lib__stud3(realsolid)],
// 1 16 20 4 0 1 0 0 0 -5 0 0 0 1 stud3.dat
  [1,16,20,4,0,1,0,0,0,-5,0,0,0,1, ldraw_lib__stud3(realsolid)],
// 4 16 -40 24 -10 40 24 -10 36 24 -6 -36 24 -6
  [4,16,-40,24,-10,40,24,-10,36,24,-6,-36,24,-6],
// 4 16 -40 24 10 -36 24 6 36 24 6 40 24 10
  [4,16,-40,24,10,-36,24,6,36,24,6,40,24,10],
// 4 16 -40 24 -10 -36 24 -6 -36 24 6 -40 24 10
  [4,16,-40,24,-10,-36,24,-6,-36,24,6,-40,24,10],
// 4 16 40 24 -10 40 24 10 36 24 6 36 24 -6
  [4,16,40,24,-10,40,24,10,36,24,6,36,24,-6],
// 0
];
module ldraw_lib__s__3010s01(step=0, col=false, unit=2/5, alt=false, line=0.2, solid=!$preview)
    makepoly(ldraw_lib__s__3010s01(solid), step=step, col=col, unit=unit, alt=alt, line=line, solid=solid);
ldraw_lib__s__3010s01(line=0.2);
// file: 3010.scad
use <../lib.scad>
use <s/3010s01.scad>
function ldraw_lib__3010() = [
// 0 Brick  1 x  4
// 0 Name: 3010.dat
// 0 Author: James Jessiman
// 0 !LDRAW_ORG Part UPDATE 2025-09
// 0 !LICENSE Licensed under CC BY 4.0 : see CAreadme.txt
// 
// 0 BFC CERTIFY CCW
  [0,"BFC","CERTIFY"],
  [0,"BFC","CCW"],
// 
// 0 !HISTORY 2001-10-26 [PTadmin] Official Update 2001-01
// 0 !HISTORY 2002-05-07 {unknown} BFC Certification
// 0 !HISTORY 2002-06-11 [PTadmin] Official Update 2002-03
// 0 !HISTORY 2002-12-12 [hafhead] New subparted version
// 0 !HISTORY 2003-08-01 [PTadmin] Official Update 2003-02
// 0 !HISTORY 2007-06-06 [PTadmin] Header formatted for Contributor Agreement
// 0 !HISTORY 2008-07-01 [PTadmin] Official Update 2008-01
// 0 !HISTORY 2025-09-27 [OrionP] Changed winding to CCW
// 0 !HISTORY 2025-09-29 [OrionP] Official Update 2025-09
// 
// 1 16 0 0 0 1 0 0 0 1 0 0 0 1 s\3010s01.dat
  [1,16,0,0,0,1,0,0,0,1,0,0,0,1, ldraw_lib__s__3010s01()],
// 4 16 -40 24 -10 40 24 -10 40 0 -10 -40 0 -10
  [4,16,-40,24,-10,40,24,-10,40,0,-10,-40,0,-10],
// 0
];
module ldraw_lib__3010(step=0, col=false, unit=2/5, alt=false, line=0.2, solid=!$preview)
    makepoly(ldraw_lib__3010(), step=step, col=col, unit=unit, alt=alt, line=line, solid=solid);
ldraw_lib__3010(line=0.2);
// main file
use <../lib.scad>
use <3010.scad>
function ldraw_lib__301021() = [
// 0 ~_Brick  1 x  4 Red (Obsolete)
// 0 Name: 301021.dat
// 0 Author: [PTadmin]
// 0 !LDRAW_ORG Part Physical_Colour UPDATE 2019-02
// 0 !LICENSE Licensed under CC BY 4.0 : see CAreadme.txt
// 
// 0 BFC CERTIFY CCW
  [0,"BFC","CERTIFY"],
  [0,"BFC","CCW"],
// 
// 0 !CATEGORY Obsolete
// 
// 0 !HISTORY 2010-12-31 [PTadmin] Official Update 2010-03
// 0 !HISTORY 2019-07-19 [Holly-Wood] Obsoleted per decision not to include physical colour parts
// 0 !HISTORY 2019-09-09 [PTadmin] Official Update 2019-02
// 
// 
// 0 // This file is a "shortcut" with the correct number for the actual
// 0 // colouring of the part (Red).
// 
// 1 4 0 0 0 1 0 0 0 1 0 0 0 1 3010.dat
  [1,4,0,0,0,1,0,0,0,1,0,0,0,1, ldraw_lib__3010()],
];
module ldraw_lib__301021(step=0, col=false, unit=2/5, alt=false, line=0.2, solid=!$preview)
    makepoly(ldraw_lib__301021(), step=step, col=col, unit=unit, alt=alt, line=line, solid=solid);
ldraw_lib__301021(line=0.2);
